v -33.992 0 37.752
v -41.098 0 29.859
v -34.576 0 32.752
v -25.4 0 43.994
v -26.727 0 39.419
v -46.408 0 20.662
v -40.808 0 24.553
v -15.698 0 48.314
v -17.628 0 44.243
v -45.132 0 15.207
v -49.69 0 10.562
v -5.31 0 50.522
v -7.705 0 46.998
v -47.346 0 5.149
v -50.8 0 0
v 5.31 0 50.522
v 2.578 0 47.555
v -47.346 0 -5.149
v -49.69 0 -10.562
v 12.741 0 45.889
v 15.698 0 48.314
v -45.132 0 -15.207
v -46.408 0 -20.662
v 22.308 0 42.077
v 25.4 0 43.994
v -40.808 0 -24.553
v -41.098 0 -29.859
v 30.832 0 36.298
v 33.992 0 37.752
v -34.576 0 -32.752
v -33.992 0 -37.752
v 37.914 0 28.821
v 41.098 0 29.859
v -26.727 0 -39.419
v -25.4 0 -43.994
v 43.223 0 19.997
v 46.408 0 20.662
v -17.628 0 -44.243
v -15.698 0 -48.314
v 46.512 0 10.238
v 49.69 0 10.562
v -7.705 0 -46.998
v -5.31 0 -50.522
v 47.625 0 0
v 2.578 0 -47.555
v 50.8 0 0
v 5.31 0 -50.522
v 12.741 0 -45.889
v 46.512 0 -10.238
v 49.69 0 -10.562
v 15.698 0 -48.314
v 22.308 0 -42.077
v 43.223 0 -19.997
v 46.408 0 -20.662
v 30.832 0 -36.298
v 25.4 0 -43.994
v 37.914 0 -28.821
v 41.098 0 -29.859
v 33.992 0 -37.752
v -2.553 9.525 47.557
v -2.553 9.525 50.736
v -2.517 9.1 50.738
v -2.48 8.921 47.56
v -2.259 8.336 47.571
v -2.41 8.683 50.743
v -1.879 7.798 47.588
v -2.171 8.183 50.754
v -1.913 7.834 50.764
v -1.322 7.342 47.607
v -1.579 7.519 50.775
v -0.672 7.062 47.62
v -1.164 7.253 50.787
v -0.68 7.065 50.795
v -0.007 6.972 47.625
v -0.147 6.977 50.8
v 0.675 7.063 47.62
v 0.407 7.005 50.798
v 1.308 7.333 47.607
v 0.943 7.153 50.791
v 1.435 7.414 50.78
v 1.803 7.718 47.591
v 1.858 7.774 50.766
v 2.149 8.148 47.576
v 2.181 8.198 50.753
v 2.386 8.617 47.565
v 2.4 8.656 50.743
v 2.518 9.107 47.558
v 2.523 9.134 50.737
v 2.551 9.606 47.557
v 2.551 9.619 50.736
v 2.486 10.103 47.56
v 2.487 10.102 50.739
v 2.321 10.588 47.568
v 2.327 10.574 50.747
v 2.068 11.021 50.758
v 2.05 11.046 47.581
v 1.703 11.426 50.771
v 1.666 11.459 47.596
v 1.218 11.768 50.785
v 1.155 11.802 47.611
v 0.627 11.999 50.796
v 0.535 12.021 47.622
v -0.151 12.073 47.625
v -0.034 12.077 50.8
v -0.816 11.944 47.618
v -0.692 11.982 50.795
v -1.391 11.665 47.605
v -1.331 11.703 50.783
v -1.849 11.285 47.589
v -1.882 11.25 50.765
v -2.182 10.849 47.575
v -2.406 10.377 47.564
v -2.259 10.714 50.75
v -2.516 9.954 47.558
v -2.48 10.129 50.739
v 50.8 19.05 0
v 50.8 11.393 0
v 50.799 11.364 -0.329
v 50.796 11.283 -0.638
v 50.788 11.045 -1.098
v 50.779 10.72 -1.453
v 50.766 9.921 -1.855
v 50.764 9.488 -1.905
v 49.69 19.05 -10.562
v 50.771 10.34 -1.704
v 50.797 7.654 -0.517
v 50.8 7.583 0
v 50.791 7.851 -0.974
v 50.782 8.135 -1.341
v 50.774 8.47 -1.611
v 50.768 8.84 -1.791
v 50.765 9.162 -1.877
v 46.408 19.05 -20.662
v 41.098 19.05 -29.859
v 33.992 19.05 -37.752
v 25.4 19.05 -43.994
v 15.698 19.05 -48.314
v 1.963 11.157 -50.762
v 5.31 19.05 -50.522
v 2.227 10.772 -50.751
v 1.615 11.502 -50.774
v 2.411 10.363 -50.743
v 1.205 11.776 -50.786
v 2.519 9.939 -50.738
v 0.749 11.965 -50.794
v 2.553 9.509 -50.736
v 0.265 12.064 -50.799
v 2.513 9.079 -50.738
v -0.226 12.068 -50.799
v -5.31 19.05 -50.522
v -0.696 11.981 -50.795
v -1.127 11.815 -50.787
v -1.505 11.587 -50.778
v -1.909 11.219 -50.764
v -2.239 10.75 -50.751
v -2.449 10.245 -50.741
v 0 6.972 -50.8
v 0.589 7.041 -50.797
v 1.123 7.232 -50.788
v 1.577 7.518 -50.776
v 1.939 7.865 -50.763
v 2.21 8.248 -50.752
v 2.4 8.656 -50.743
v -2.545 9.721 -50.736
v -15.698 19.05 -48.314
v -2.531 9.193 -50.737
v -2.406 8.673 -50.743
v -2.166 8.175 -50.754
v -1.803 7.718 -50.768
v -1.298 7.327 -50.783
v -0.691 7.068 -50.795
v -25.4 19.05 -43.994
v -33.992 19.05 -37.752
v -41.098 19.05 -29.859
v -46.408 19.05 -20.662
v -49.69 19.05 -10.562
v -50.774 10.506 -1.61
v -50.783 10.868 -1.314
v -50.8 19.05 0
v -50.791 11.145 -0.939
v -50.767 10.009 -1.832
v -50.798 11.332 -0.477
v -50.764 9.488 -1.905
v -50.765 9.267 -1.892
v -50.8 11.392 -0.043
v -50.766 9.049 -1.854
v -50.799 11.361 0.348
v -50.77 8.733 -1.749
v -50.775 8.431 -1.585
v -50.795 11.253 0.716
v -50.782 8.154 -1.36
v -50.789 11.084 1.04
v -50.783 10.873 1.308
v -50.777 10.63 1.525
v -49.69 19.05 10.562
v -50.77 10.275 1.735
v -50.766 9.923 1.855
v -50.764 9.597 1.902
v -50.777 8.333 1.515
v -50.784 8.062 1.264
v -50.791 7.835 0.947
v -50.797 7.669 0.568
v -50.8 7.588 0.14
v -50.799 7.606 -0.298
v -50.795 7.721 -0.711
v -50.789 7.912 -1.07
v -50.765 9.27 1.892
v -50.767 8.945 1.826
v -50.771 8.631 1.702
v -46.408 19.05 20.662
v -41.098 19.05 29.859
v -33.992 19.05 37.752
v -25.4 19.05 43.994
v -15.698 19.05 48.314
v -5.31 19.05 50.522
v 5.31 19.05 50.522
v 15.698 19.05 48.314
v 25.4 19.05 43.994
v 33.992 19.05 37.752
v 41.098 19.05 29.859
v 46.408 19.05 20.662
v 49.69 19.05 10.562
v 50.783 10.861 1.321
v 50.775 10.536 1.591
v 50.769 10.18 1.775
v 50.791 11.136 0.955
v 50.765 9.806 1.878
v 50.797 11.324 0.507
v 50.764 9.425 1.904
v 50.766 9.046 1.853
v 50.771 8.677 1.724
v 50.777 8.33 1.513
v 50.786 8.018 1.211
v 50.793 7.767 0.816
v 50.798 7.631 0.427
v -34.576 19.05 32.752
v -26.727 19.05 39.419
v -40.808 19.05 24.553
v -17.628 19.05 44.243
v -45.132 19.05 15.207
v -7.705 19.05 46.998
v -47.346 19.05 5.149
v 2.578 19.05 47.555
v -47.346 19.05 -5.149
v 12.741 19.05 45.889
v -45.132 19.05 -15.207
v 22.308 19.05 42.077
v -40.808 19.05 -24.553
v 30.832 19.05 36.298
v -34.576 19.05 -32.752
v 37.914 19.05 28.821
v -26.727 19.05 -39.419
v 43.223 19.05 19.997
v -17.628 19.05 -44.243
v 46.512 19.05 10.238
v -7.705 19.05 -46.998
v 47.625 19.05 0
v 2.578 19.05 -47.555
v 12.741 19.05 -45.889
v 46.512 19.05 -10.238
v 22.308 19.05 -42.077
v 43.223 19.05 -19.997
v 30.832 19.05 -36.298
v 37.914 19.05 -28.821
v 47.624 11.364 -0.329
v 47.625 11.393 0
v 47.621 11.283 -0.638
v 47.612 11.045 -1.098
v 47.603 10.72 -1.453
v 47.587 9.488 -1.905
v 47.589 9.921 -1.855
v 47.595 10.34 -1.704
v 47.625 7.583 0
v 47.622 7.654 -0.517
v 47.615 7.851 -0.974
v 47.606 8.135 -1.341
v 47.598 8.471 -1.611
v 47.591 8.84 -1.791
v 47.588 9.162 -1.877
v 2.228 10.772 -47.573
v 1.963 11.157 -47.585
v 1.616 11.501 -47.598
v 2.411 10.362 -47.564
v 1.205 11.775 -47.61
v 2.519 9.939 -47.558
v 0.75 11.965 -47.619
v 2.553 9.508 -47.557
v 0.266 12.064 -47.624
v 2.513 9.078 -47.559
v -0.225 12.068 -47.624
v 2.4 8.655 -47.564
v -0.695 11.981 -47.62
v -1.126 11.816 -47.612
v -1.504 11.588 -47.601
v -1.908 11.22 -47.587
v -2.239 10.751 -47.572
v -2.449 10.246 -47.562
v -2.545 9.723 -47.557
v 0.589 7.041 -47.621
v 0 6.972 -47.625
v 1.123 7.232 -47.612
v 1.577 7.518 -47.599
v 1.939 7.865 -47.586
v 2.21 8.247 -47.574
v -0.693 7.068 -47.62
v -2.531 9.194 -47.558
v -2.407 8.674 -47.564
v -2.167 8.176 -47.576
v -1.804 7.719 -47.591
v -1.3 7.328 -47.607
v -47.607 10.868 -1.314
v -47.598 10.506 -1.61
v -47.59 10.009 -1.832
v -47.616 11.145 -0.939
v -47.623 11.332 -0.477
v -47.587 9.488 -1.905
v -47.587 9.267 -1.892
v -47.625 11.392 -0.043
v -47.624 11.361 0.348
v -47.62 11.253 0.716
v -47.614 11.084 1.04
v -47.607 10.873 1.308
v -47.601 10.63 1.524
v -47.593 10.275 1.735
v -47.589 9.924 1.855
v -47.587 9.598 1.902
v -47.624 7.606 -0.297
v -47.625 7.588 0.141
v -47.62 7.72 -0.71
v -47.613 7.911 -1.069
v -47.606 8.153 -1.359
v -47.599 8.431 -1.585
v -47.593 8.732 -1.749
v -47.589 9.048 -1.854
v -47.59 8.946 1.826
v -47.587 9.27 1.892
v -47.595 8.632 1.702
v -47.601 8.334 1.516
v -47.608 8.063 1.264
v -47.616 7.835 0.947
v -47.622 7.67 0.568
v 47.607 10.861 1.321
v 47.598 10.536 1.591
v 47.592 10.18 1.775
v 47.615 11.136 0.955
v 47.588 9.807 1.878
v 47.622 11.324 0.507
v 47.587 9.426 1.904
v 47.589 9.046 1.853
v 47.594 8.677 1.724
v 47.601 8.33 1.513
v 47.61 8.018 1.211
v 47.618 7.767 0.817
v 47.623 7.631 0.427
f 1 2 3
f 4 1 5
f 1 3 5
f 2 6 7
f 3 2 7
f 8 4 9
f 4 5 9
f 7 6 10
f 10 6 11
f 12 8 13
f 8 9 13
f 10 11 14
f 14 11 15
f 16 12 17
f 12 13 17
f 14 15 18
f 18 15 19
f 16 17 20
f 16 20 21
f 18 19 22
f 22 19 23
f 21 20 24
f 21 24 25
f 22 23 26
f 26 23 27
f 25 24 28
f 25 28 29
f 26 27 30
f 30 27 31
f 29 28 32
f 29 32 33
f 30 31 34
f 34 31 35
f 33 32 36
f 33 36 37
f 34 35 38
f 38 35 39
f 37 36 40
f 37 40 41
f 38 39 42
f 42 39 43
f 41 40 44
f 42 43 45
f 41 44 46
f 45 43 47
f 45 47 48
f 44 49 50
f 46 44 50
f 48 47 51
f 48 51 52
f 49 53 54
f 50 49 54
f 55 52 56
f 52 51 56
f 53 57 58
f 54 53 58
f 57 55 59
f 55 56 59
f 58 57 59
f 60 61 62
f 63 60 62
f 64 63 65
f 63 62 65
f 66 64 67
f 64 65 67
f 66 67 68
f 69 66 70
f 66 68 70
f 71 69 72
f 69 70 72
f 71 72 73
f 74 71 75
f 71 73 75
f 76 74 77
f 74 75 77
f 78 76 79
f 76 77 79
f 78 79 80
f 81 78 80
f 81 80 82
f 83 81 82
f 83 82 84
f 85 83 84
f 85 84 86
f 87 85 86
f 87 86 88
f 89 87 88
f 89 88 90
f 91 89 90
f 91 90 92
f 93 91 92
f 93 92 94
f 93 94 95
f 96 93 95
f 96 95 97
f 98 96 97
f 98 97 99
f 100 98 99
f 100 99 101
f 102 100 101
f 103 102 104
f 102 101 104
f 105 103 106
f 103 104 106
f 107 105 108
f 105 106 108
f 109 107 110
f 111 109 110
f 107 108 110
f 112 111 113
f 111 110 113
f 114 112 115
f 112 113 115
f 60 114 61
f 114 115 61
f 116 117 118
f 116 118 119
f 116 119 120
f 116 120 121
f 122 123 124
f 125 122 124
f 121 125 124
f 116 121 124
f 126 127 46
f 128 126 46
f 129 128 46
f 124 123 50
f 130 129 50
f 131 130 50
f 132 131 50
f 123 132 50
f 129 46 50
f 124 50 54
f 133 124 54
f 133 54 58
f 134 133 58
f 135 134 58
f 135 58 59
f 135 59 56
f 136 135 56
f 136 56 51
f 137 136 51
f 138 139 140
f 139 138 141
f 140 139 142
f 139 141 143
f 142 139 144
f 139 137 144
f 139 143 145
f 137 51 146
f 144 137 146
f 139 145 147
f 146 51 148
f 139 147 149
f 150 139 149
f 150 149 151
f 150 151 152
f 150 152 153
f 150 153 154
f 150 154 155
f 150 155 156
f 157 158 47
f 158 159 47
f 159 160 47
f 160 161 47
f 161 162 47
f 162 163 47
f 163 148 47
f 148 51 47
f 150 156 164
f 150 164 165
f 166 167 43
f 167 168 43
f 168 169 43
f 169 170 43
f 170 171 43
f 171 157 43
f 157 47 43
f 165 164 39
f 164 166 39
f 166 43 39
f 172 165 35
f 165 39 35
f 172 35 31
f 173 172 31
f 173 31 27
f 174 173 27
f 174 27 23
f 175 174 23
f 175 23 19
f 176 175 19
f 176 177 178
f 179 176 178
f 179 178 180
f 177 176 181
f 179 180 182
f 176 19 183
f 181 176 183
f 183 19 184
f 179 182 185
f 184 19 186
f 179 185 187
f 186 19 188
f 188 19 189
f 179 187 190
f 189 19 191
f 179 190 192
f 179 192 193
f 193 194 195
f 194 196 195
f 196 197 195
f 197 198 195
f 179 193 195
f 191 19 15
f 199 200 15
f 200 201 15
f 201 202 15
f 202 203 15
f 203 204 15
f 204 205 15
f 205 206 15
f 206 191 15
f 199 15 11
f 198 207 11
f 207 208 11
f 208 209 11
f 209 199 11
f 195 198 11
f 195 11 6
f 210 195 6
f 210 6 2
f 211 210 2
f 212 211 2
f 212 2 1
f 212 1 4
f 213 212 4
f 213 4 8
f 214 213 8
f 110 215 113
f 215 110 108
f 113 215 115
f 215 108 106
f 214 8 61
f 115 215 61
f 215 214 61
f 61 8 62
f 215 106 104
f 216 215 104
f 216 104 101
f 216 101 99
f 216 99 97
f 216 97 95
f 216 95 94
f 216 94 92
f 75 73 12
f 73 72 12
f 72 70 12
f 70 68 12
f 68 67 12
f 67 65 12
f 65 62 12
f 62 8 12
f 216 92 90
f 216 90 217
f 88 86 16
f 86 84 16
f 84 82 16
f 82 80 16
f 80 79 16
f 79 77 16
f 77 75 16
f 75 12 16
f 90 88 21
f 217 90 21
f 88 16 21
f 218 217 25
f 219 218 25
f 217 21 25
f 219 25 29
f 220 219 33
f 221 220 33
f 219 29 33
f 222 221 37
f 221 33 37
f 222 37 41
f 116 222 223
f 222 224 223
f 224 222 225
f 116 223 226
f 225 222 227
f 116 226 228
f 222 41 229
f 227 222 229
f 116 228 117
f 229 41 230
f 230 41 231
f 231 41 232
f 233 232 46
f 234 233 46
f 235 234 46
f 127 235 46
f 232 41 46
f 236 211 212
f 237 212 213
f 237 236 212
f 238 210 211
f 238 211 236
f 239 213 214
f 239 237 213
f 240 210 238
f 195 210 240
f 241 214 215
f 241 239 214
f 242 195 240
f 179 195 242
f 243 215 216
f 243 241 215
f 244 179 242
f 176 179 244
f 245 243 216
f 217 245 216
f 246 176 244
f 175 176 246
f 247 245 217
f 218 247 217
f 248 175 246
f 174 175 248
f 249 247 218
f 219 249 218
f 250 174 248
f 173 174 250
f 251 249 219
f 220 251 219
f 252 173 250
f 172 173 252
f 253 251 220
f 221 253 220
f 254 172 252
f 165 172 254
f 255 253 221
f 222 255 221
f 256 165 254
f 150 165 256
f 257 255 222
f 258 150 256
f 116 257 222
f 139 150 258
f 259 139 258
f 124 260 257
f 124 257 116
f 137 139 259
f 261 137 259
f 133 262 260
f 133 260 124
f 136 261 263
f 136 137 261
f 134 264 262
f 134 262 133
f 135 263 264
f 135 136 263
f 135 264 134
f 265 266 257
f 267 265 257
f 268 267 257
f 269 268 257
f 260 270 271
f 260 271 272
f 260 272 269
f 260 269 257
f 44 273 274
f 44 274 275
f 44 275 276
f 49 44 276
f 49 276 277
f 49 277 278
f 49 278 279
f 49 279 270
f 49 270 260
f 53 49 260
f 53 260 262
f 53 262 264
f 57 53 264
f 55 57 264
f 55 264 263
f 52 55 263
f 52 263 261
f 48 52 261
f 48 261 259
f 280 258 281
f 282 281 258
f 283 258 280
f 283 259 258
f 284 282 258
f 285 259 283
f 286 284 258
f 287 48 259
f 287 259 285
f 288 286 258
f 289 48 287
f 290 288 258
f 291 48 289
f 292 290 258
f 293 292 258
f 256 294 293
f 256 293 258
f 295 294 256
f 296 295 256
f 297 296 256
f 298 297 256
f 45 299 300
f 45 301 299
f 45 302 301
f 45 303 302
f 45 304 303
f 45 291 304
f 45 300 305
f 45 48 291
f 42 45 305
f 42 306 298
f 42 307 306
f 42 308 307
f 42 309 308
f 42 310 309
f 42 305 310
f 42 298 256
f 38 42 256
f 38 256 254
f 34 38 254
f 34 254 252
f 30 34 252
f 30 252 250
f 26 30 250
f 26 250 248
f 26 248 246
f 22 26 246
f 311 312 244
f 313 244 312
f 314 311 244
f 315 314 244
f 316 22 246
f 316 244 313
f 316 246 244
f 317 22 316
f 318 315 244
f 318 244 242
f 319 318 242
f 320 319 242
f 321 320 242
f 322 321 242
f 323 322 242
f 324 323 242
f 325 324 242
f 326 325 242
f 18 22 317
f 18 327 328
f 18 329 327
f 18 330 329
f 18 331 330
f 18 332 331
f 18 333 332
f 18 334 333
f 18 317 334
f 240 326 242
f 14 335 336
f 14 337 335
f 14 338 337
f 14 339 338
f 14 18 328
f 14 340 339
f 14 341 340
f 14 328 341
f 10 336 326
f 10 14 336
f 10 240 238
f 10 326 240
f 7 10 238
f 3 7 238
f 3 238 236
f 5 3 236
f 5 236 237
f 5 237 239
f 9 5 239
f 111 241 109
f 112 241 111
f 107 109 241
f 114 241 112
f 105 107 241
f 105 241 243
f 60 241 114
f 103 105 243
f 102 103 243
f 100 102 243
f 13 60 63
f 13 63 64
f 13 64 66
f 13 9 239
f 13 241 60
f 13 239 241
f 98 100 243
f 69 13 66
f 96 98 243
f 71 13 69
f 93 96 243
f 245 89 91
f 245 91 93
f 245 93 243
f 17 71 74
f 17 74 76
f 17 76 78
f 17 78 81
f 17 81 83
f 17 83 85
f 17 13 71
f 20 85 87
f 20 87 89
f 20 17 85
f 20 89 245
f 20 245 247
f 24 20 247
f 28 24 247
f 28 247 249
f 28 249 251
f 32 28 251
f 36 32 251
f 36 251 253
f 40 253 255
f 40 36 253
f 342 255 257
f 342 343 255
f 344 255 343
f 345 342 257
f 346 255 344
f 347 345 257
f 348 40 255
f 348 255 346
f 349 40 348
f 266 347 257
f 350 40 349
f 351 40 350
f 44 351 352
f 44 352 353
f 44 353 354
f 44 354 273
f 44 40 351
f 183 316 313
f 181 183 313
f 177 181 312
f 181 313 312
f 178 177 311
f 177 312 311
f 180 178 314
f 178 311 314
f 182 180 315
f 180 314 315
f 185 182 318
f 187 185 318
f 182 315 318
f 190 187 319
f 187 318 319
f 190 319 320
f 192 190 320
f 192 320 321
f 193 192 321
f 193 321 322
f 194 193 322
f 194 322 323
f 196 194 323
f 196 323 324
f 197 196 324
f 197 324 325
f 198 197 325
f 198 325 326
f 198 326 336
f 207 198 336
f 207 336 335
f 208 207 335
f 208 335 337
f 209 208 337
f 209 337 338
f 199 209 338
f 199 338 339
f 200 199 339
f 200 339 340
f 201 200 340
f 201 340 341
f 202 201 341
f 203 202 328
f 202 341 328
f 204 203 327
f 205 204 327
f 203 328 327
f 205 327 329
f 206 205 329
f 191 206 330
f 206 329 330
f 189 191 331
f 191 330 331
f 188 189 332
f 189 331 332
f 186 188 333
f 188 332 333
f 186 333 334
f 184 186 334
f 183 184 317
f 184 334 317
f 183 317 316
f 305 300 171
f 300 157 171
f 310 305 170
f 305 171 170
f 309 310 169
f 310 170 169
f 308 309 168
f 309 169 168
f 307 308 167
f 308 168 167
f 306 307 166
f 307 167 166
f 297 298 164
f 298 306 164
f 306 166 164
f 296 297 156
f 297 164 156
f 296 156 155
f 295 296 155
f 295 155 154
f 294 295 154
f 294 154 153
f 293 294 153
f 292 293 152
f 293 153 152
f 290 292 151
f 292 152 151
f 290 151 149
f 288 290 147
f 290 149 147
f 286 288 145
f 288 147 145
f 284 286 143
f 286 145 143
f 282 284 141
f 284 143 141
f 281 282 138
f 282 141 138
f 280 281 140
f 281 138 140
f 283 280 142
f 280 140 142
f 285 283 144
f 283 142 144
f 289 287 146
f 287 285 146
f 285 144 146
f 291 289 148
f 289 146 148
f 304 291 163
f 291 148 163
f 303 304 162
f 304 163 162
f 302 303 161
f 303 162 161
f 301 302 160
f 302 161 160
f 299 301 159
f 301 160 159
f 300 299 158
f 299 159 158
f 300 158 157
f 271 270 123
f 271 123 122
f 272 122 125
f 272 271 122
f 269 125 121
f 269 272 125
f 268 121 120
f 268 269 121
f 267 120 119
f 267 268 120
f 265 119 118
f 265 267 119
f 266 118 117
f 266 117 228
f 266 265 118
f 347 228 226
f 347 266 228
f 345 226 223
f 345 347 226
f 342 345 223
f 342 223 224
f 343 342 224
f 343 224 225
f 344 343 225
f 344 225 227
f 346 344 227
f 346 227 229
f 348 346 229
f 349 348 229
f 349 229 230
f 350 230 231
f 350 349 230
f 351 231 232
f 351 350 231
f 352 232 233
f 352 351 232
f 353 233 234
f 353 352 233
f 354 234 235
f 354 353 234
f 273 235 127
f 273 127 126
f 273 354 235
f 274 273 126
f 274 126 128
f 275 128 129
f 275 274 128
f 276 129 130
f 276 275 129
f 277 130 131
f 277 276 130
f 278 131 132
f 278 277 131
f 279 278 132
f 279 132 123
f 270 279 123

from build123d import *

# Parameters (mm, degrees)
SKETCH1_R                       = 50.8
SKETCH1_R_2                     = 47.625
BOSS_EXTRUDE1_DEPTH             = 19.05
SKETCH5_W                       = 2.5527
SKETCH5_H                       = 82.55
TAP_DRILL_FOR_1_4_20_TAP2_D     = 5.1054
TAP_DRILL_FOR_1_4_20_TAP2_DEPTH = 82.55
SKETCH10_R                      = 1.905
CUT_EXTRUDE3_DEPTH              = 83.5500001
CUT_EXTRUDE3_DEPTH_BACK         = 20.0500001


with BuildPart() as part:
    # Sketch1 → Boss-Extrude1 (new body)
    with BuildSketch(Plane(origin=(0, 0, 0), x_dir=(1, 0, 0), z_dir=(0, 1, 0))):
        Circle(SKETCH1_R)
        Circle(SKETCH1_R_2, mode=Mode.SUBTRACT)
    extrude(amount=BOSS_EXTRUDE1_DEPTH)

    # Sketch5 → Tap Drill for 1/4-20 Tap1 (revolve, cut)
    with BuildSketch(Plane(origin=(0, 9.525, 31.75), x_dir=(0, -1, 0), z_dir=(1, 0, 0))):
        with Locations((1.27635, 41.275)):
            Rectangle(SKETCH5_W, SKETCH5_H)
    revolve(axis=Axis((0, 9.525, 38.1), (0, 0, -1)), mode=Mode.SUBTRACT)

    # Tap Drill for 1/4-20 Tap2
    with Locations(Plane(origin=(0, 0, -31.75), x_dir=(1, 0, 0), z_dir=(0, 0, -1))):
        with Locations((0, -9.525)):
            Hole(TAP_DRILL_FOR_1_4_20_TAP2_D / 2, depth=TAP_DRILL_FOR_1_4_20_TAP2_DEPTH)

    # Sketch10 → Cut-Extrude3 (cut, two sides)
    with BuildSketch(Plane(origin=(-31.75, 0, 0), x_dir=(0, 0, -1), z_dir=(1, 0, 0))) as cut_extrude3_sk:
        with Locations((0, 9.487883811)):
            Circle(SKETCH10_R)
    extrude(amount=CUT_EXTRUDE3_DEPTH, mode=Mode.SUBTRACT)
    extrude(cut_extrude3_sk.sketch, amount=-CUT_EXTRUDE3_DEPTH_BACK, mode=Mode.SUBTRACT)


solid = part.part
